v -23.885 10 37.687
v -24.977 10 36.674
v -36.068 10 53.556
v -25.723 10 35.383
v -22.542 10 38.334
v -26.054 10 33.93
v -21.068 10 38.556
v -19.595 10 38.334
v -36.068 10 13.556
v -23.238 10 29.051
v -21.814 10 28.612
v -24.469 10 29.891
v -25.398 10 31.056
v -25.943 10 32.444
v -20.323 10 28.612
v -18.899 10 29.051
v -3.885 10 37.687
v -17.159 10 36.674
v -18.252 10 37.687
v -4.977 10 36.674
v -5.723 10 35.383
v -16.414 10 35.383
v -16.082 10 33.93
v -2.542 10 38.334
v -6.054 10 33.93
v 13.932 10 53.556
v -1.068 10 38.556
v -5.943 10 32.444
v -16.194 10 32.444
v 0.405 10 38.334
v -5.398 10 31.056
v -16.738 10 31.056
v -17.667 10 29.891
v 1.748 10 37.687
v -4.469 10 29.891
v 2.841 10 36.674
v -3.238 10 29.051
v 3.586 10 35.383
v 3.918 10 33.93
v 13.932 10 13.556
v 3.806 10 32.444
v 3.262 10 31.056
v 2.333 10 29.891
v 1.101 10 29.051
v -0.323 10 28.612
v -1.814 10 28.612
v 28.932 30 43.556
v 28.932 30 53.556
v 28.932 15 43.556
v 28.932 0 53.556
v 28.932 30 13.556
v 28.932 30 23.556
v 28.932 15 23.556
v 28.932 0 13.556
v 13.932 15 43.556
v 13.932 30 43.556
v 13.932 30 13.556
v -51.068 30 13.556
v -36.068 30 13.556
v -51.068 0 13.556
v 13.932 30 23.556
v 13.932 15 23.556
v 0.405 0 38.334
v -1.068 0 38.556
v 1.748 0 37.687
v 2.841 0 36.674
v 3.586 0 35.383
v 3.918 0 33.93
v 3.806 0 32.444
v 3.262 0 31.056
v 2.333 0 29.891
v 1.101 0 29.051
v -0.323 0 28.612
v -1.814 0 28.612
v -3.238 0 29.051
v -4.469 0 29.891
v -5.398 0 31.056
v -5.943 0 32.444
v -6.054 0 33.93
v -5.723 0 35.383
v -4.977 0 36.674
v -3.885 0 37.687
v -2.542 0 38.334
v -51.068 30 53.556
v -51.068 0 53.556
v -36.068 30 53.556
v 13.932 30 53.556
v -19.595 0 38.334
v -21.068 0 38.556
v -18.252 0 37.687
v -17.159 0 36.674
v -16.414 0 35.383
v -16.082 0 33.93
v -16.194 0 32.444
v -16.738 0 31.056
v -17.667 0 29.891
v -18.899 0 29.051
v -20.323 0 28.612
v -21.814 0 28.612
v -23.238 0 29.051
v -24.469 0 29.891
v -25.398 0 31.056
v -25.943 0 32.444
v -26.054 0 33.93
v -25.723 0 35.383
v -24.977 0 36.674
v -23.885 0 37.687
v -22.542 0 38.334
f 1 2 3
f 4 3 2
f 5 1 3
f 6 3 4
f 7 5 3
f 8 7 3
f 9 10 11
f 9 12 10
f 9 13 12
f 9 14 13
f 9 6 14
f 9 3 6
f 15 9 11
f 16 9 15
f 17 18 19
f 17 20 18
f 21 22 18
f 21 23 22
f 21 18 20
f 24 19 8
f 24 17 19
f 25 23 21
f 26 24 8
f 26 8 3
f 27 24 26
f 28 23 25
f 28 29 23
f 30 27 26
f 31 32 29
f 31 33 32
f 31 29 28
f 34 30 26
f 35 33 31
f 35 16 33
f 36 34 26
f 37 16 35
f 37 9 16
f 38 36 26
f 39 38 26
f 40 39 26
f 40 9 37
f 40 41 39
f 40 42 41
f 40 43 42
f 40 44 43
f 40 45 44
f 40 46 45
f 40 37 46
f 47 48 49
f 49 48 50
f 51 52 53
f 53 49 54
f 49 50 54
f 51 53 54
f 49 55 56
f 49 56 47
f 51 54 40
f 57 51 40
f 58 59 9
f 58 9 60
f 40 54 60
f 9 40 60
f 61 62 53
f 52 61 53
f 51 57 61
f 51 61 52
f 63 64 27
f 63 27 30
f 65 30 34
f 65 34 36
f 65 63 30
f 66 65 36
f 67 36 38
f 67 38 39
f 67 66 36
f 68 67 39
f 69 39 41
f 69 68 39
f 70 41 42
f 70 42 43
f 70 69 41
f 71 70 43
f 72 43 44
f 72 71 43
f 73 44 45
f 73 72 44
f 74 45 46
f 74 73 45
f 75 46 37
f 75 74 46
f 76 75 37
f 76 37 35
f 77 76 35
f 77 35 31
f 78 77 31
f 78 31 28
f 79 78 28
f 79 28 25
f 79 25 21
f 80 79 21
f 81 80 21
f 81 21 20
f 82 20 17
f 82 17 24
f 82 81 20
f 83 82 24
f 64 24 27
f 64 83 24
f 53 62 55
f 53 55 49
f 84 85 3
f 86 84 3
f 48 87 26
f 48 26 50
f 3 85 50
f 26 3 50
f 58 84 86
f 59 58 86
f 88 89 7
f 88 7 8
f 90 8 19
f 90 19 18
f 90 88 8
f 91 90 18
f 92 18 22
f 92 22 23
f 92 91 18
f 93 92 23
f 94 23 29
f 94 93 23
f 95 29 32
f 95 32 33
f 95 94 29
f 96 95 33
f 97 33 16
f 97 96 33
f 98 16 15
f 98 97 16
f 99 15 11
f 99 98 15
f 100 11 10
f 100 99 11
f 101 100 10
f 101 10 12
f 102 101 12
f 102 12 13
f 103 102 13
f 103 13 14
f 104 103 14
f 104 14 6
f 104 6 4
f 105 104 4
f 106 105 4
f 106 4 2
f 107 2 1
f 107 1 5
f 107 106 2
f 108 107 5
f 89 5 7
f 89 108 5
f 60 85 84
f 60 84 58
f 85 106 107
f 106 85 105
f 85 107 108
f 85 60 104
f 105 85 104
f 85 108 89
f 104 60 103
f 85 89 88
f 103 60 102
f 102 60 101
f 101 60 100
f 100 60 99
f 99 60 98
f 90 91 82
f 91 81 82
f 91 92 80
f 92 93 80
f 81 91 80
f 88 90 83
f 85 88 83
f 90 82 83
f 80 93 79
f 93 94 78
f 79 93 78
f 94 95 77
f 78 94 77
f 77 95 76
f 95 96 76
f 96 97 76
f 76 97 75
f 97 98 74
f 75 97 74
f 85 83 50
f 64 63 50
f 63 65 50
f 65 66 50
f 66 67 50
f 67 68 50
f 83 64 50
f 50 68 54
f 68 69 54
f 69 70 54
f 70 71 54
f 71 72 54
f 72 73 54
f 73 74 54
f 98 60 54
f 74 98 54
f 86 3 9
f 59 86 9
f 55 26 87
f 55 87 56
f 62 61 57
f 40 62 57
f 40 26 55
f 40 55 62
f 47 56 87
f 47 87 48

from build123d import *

# Parameters (mm, degrees)
SKETCH_1_W        = 15
SKETCH_1_H        = 40
EXTRUDE_2_DEPTH   = 30
SKETCH_1_H_2      = 10
EXTRUDE_2_2_DEPTH = 30
EXTRUDE_2_3_DEPTH = 30
SKETCH_1_6_W      = 15
SKETCH_1_6_H      = 20
EXTRUDE_4_DEPTH   = 15
SKETCH_1_7_R      = 5
EXTRUDE_5_DEPTH   = 10


with BuildPart() as part:
    # 스케치1 → 보스-돌출2 (new body)
    with BuildSketch(Plane(origin=(0, 0, 0), x_dir=(1, 0, 0), z_dir=(0, 1, 0))):
        with Locations((-43.568318821, -33.556262559)):
            Rectangle(SKETCH_1_W, SKETCH_1_H)
    extrude(amount=EXTRUDE_2_DEPTH)



with BuildPart() as body_2:
    # 스케치1 → Extrude 2 2 (new body)
    with BuildSketch(Plane(origin=(0, 0, 0), x_dir=(1, 0, 0), z_dir=(0, 1, 0))):
        with Locations((21.431681179, -18.556262559)):
            Rectangle(SKETCH_1_W, SKETCH_1_H_2)
    extrude(amount=EXTRUDE_2_2_DEPTH)



with BuildPart() as body_3:
    # 스케치1 → Extrude 2 3 (new body)
    with BuildSketch(Plane(origin=(0, 0, 0), x_dir=(1, 0, 0), z_dir=(0, 1, 0))):
        with Locations((21.431681179, -48.556262559)):
            Rectangle(SKETCH_1_W, SKETCH_1_H_2)
    extrude(amount=EXTRUDE_2_3_DEPTH)


with BuildPart() as body_2_1:
    add(body_2.part)

    add(body_3.part)  # 보스-돌출4 merges body 3
    # 스케치1<6> → 보스-돌출4 (add)
    with BuildSketch(Plane(origin=(0, 0, 0), x_dir=(1, 0, 0), z_dir=(0, 1, 0))):
        with Locations((21.431681179, -33.556262559)):
            Rectangle(SKETCH_1_6_W, SKETCH_1_6_H)
    extrude(amount=EXTRUDE_4_DEPTH)


with BuildPart() as part_1:
    add(part.part)

    add(body_2_1.part)  # 보스-돌출5 merges body 2
    # 스케치1<7> → 보스-돌출5 (add)
    with BuildSketch(Plane(origin=(0, 0, 0), x_dir=(1, 0, 0), z_dir=(0, 1, 0))):
        Polygon((13.931681179, -13.556262559), (-36.068318821, -13.556262559), (-36.068318821, -53.556262559), (13.931681179, -53.556262559), (13.931681179, -43.556262559), (13.931681179, -23.556262559), align=None)
        with Locations((-21.068318821, -33.556262559)):
            Circle(SKETCH_1_7_R, mode=Mode.SUBTRACT)
        with Locations((-1.068318821, -33.556262559)):
            Circle(SKETCH_1_7_R, mode=Mode.SUBTRACT)
    extrude(amount=EXTRUDE_5_DEPTH)


solid = part_1.part
